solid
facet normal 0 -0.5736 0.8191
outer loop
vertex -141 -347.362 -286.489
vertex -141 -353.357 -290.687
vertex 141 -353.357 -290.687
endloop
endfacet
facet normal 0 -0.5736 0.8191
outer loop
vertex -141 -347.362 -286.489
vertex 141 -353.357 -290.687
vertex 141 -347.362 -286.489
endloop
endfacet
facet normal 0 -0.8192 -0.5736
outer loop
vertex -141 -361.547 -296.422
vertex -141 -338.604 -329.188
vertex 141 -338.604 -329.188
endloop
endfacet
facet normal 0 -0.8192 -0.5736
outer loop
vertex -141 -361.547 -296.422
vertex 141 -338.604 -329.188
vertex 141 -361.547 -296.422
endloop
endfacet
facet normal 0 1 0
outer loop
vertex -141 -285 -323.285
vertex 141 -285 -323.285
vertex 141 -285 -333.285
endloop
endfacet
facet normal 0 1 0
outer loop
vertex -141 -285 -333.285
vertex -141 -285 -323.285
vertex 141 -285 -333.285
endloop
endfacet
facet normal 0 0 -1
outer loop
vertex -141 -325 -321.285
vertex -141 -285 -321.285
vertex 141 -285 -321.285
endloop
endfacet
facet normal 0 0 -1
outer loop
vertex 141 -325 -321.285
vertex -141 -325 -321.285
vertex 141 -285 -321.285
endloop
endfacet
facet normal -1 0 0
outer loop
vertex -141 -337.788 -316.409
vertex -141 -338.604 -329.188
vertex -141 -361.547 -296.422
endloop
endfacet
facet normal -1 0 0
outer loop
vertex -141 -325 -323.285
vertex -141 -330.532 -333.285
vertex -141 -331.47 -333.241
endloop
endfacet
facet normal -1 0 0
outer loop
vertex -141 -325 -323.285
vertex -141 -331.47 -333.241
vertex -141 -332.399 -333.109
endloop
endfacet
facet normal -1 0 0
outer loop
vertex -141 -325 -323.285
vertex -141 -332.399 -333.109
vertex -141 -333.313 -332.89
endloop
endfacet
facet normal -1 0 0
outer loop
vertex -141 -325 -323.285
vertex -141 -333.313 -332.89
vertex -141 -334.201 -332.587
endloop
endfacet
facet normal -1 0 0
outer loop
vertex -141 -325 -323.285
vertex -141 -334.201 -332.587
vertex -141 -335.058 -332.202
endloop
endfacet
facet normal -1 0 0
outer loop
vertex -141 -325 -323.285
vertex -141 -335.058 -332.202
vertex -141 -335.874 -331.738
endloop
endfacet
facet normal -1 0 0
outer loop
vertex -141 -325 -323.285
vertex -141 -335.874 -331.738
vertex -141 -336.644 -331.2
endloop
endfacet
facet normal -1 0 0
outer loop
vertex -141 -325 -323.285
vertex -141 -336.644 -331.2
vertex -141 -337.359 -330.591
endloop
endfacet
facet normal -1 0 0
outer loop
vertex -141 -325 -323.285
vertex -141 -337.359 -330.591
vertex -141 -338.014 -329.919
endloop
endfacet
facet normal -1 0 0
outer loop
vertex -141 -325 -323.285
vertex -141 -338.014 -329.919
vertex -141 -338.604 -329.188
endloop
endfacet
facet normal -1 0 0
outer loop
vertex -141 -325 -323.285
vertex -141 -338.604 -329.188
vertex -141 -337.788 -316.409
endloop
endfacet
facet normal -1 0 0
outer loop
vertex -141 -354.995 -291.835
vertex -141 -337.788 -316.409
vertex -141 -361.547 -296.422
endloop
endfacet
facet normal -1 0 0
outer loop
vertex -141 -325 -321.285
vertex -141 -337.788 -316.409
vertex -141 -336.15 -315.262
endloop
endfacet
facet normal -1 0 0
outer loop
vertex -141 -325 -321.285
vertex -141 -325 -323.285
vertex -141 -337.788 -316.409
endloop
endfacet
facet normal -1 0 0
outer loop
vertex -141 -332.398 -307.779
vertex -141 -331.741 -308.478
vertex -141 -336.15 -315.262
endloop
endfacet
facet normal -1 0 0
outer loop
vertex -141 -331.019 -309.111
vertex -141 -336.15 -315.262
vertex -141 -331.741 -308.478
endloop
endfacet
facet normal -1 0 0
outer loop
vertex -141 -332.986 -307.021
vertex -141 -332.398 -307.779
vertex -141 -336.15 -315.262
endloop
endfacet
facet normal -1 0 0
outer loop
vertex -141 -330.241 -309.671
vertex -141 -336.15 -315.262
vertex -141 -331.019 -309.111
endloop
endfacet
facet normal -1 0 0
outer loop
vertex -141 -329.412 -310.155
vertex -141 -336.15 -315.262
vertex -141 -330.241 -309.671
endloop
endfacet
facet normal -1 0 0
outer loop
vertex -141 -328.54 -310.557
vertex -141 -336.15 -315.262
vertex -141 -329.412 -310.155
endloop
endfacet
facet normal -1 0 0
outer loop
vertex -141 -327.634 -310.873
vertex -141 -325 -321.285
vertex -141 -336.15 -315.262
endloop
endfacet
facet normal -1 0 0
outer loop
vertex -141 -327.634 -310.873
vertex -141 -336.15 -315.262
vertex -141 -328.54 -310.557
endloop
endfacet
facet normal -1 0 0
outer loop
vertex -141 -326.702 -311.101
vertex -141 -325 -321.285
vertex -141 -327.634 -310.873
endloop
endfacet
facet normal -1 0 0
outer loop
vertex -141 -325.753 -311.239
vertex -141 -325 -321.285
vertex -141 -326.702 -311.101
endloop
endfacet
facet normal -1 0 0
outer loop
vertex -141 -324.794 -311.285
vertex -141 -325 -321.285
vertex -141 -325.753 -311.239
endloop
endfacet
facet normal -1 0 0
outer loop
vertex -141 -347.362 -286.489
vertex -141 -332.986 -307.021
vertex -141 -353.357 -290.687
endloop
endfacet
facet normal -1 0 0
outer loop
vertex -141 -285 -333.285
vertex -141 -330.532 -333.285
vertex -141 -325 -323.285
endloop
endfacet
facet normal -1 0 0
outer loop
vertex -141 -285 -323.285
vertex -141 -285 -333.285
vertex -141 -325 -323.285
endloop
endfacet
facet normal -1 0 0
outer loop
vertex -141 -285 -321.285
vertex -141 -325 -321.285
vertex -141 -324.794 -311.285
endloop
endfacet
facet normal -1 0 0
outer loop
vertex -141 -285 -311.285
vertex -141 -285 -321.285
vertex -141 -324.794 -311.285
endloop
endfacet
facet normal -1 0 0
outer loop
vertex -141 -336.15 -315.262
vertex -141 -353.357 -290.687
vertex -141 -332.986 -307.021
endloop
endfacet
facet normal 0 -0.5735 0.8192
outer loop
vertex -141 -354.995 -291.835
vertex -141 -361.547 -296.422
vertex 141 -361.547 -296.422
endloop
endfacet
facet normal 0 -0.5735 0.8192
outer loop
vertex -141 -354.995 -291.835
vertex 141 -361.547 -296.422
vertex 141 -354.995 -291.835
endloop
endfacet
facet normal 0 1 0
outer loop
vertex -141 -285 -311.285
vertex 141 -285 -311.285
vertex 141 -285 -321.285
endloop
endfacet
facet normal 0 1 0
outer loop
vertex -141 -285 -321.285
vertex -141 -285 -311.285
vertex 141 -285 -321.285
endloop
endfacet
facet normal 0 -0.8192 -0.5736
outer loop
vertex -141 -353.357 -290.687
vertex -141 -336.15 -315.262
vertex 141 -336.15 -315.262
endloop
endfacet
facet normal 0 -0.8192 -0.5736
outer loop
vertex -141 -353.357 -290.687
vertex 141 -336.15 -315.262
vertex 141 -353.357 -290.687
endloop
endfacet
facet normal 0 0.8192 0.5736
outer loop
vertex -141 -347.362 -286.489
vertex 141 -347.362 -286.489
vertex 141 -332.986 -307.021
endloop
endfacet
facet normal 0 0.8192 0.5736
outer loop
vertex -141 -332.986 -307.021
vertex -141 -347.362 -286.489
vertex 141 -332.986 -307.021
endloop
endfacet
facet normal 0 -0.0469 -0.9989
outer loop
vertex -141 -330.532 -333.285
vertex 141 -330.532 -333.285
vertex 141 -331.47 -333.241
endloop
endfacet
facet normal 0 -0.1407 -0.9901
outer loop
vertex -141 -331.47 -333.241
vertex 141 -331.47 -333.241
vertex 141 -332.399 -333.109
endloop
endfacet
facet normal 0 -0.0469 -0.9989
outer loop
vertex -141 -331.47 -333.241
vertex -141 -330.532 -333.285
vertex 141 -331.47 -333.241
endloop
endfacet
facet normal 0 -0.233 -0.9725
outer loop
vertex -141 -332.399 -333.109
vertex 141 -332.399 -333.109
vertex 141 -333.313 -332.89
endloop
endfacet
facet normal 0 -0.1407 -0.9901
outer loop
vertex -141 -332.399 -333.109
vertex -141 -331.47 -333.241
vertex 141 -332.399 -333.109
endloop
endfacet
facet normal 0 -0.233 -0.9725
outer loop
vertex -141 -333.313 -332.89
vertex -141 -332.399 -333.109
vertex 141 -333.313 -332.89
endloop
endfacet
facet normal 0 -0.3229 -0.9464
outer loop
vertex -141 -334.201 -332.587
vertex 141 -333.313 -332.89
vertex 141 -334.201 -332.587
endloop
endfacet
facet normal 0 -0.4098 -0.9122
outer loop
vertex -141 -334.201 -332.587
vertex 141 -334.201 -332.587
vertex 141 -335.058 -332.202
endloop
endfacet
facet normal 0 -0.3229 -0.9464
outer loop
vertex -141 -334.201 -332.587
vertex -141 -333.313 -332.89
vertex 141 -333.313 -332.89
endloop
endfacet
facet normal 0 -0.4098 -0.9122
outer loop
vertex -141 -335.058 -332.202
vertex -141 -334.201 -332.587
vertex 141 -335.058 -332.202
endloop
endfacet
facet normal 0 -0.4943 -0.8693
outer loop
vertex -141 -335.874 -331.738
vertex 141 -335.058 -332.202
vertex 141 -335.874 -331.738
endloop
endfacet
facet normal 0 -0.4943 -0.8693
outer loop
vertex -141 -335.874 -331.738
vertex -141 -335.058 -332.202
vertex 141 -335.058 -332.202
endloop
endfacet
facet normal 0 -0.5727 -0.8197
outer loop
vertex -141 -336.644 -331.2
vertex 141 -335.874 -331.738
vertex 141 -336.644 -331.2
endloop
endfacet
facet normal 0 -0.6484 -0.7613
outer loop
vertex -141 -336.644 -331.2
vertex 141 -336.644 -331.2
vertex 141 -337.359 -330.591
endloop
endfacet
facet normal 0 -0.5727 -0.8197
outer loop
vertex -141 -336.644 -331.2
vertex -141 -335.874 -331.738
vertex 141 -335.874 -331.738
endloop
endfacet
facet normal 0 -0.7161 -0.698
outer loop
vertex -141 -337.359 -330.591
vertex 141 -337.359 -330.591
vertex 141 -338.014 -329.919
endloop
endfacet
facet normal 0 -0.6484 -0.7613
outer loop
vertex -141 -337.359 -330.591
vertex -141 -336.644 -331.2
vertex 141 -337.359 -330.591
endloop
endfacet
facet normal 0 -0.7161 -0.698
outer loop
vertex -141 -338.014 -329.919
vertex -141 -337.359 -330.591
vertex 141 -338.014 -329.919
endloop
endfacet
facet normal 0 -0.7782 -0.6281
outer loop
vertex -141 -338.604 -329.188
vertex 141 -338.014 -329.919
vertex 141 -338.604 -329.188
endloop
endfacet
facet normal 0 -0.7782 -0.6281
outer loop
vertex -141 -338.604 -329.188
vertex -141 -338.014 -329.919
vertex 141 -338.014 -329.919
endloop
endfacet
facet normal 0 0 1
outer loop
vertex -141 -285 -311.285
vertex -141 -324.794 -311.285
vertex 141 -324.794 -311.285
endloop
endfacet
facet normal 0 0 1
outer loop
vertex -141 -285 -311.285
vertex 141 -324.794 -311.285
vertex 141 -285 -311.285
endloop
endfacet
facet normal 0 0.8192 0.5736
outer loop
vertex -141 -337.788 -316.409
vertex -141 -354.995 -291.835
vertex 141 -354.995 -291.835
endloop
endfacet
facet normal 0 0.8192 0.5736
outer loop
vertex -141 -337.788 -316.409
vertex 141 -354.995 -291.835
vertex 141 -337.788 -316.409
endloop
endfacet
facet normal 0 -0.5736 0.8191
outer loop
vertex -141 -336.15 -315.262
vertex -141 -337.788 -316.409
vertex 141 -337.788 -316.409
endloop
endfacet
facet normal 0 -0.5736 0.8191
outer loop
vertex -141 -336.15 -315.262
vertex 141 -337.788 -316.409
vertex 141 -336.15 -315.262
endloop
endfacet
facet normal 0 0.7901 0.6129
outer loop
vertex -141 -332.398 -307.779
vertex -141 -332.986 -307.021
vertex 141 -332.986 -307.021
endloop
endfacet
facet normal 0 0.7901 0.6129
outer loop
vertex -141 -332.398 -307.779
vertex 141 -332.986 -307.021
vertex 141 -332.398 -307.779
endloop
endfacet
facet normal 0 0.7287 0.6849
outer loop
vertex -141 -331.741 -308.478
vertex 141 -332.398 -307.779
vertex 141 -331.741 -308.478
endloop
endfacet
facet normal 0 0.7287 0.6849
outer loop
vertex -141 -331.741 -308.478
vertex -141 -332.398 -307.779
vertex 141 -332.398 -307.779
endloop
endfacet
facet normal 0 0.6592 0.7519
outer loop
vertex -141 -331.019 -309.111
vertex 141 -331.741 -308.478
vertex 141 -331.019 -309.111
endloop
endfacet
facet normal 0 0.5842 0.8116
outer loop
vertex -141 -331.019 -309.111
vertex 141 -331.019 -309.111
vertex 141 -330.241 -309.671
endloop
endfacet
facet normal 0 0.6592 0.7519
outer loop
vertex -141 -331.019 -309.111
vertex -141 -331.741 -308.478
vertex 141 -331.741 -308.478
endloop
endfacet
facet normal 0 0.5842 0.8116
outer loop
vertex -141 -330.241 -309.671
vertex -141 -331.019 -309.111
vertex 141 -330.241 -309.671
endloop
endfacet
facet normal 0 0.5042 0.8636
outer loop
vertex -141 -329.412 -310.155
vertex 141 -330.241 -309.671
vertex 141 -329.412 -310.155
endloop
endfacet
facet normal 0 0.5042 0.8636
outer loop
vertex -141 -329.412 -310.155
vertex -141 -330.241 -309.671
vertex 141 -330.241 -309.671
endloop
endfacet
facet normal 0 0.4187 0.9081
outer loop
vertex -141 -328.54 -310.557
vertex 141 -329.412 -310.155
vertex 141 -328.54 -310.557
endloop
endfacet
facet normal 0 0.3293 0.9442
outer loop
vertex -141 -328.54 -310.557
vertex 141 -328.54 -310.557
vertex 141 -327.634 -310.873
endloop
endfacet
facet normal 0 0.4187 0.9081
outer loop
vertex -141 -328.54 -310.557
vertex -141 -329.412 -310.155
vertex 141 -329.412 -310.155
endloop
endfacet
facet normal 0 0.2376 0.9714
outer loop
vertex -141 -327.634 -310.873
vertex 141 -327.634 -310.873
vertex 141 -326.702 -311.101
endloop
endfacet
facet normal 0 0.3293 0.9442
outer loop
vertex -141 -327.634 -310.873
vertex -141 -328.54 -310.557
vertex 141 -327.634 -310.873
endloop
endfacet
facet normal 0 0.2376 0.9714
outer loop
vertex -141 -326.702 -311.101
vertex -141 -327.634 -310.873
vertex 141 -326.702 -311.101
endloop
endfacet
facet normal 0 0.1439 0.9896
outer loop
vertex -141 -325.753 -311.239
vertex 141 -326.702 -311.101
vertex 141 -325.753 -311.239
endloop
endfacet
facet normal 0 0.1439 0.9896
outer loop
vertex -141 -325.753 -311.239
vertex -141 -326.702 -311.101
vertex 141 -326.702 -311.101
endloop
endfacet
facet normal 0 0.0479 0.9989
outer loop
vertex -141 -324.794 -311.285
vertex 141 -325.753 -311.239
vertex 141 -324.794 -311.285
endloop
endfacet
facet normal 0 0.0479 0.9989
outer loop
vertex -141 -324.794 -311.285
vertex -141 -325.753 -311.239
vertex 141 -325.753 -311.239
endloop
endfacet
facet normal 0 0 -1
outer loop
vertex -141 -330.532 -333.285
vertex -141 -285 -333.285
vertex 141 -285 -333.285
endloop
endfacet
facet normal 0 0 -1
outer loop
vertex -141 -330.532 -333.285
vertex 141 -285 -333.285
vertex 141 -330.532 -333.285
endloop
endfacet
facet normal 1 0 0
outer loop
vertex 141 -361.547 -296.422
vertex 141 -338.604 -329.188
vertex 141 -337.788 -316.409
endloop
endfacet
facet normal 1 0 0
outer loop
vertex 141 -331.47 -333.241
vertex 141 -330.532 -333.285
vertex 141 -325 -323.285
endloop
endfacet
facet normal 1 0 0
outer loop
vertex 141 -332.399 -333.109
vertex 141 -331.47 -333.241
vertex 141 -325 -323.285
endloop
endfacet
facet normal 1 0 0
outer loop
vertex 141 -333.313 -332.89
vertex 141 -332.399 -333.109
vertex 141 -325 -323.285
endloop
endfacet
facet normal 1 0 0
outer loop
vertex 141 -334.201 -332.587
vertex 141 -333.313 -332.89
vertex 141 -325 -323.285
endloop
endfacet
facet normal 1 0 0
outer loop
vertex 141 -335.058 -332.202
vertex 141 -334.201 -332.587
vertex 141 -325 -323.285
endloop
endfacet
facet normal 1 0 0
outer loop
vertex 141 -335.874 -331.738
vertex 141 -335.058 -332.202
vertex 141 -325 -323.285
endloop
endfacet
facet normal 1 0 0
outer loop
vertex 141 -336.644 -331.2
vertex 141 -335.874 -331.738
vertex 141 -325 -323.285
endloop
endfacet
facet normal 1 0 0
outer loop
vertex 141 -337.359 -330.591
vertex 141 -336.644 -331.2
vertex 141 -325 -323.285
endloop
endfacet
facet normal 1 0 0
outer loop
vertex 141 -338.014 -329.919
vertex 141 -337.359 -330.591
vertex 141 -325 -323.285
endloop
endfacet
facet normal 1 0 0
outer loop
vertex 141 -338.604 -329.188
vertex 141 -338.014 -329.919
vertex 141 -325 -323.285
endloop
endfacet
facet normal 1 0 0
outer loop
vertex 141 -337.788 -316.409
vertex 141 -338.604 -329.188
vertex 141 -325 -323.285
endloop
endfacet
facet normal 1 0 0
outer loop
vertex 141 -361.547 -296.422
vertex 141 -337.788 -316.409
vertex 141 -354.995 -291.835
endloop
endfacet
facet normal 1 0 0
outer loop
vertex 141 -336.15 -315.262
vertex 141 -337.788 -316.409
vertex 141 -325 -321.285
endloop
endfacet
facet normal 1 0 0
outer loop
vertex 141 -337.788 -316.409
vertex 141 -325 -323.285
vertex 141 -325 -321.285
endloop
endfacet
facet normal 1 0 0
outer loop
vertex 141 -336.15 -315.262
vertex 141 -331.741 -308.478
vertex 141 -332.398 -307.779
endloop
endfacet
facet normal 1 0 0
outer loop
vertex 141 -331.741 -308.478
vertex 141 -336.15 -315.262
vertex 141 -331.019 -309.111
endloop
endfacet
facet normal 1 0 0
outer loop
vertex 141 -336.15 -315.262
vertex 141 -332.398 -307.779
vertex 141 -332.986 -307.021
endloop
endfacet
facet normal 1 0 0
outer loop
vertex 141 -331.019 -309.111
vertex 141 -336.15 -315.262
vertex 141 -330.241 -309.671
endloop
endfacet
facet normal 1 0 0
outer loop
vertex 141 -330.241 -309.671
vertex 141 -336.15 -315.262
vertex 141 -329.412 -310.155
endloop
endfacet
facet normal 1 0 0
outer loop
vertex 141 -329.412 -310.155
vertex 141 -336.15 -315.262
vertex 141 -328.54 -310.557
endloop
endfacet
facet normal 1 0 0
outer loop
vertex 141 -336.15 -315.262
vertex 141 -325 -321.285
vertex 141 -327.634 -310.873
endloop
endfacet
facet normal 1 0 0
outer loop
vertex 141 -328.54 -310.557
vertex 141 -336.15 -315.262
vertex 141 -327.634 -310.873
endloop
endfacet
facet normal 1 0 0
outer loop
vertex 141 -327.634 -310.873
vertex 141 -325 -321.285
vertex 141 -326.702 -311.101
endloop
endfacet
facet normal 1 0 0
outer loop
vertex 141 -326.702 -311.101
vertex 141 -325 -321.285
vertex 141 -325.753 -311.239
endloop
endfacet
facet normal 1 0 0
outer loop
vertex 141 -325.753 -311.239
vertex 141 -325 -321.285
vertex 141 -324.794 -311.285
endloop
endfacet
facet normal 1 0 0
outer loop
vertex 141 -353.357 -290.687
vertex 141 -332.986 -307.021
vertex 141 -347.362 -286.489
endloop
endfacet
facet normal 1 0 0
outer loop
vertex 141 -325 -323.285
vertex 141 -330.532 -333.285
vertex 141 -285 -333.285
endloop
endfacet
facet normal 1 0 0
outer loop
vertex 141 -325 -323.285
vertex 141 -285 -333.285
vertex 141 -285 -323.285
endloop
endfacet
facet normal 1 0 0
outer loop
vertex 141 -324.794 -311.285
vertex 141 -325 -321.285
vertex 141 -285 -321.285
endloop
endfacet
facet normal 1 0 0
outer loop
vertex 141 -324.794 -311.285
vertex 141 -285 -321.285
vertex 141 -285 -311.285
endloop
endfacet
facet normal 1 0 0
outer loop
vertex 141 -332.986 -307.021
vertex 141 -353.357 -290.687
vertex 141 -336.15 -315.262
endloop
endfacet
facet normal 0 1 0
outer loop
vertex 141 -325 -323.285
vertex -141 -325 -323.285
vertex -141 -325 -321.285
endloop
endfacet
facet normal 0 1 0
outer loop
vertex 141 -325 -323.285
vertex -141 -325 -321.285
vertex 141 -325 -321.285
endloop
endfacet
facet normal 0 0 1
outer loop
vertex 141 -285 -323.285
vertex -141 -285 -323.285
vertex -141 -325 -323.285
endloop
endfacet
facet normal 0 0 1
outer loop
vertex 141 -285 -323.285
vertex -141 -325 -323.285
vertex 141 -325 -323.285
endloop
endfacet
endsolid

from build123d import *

# Parameters (mm, degrees)
BOSS_EXTRUDE2_DEPTH      = 141
BOSS_EXTRUDE2_DEPTH_BACK = 141
CAVITY1_START            = -323.284735655
CAVITY1_OUTLINE_W        = 282
CAVITY1_OUTLINE_H        = 40
CAVITY1_DEPTH            = 2


# Read off the part's stored shape, not the designer's step: Cavity1
with BuildPart() as part:
    # Sketch1 → Boss-Extrude2 (new, two sides: drawn at the far end of the back side and taken through both)
    with BuildSketch(Plane(origin=(0, 0, -321.284735655), x_dir=(0, 0, -1), z_dir=(1, 0, 0)).offset(-BOSS_EXTRUDE2_DEPTH_BACK)):
        with BuildLine():
            Line((-10, -285), (12, -285))
            Line((12, -285), (12, -330.531793911))
            ThreePointArc((12, -330.531793911), (10.917125793, -335.057815078), (7.903026481, -338.603613927))
            Line((7.903026481, -338.603613927), (-24.863055291, -361.546671381))
            Line((-24.863055291, -361.546671381), (-29.450107081, -354.994945144))
            Line((-29.450107081, -354.994945144), (-4.875892155, -337.787894608))
            Line((-4.875892155, -337.787894608), (-6.023045028, -336.149590519))
            Line((-6.023045028, -336.149590519), (-30.597606357, -353.35688361))
            Line((-30.597606357, -353.35688361), (-34.795346904, -347.361888815))
            Line((-34.795346904, -347.361888815), (-14.264235636, -332.985849937))
            ThreePointArc((-14.264235636, -332.985849937), (-11.129891668, -329.411815627), (-10, -324.794329494))
            Line((-10, -324.794329494), (-10, -285))
        make_face()
    extrude(amount=BOSS_EXTRUDE2_DEPTH + BOSS_EXTRUDE2_DEPTH_BACK)

    # Cavity1 outline → Cavity1 (cut)
    with BuildSketch(Plane.XY.offset(CAVITY1_START)):
        with Locations((0, -305)):
            Rectangle(CAVITY1_OUTLINE_W, CAVITY1_OUTLINE_H)
    extrude(amount=CAVITY1_DEPTH, mode=Mode.SUBTRACT)


solid = part.part
